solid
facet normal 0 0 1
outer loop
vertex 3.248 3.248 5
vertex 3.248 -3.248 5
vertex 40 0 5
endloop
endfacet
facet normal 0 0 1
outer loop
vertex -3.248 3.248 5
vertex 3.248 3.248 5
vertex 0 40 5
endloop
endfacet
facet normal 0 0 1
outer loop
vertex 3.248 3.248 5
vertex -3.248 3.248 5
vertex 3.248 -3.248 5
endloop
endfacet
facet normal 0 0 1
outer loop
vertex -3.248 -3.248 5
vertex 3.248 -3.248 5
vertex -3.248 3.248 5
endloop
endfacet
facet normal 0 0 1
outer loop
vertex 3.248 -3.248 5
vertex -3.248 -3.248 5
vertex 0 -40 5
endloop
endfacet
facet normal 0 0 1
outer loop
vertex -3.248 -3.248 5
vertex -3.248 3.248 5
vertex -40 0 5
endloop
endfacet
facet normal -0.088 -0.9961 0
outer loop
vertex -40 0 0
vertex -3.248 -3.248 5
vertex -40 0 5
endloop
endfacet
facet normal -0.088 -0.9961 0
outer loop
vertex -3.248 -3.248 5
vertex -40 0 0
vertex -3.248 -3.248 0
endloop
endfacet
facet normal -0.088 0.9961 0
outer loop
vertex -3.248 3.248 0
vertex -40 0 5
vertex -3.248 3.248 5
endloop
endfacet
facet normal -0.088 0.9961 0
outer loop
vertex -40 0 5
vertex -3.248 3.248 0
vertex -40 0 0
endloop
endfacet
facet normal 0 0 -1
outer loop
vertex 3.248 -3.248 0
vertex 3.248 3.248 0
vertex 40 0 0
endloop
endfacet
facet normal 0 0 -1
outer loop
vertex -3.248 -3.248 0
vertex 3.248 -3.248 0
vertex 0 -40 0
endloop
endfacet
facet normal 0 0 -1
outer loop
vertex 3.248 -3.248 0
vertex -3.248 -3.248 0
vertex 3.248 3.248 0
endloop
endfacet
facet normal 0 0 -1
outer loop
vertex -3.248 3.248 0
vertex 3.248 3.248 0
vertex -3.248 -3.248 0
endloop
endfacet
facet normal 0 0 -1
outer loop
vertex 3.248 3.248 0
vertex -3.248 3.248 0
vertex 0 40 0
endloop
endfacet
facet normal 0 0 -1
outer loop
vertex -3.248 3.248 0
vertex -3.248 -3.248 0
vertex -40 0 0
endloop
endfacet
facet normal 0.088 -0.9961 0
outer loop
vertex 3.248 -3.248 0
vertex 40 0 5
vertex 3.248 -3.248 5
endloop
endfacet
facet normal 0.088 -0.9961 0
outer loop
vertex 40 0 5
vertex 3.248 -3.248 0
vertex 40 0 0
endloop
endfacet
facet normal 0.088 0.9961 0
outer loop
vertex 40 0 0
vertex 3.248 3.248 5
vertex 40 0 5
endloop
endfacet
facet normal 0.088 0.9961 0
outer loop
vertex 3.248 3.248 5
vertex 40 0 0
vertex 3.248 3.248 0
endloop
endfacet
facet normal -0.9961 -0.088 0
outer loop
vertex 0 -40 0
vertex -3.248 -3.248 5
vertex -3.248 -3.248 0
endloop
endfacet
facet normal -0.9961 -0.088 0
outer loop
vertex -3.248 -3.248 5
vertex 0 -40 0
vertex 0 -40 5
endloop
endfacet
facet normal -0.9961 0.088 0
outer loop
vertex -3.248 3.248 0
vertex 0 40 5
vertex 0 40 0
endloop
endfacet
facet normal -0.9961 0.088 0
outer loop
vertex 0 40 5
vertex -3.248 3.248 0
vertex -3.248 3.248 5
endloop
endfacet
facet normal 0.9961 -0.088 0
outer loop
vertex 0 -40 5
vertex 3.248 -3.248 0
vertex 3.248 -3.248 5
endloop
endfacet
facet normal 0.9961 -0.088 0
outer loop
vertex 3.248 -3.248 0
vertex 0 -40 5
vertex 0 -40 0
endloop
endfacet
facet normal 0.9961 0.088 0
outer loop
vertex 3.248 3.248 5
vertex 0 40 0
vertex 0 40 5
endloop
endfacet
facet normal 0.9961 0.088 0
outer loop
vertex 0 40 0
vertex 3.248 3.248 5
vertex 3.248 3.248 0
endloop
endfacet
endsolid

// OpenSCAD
module fourStar(radius, fatness, height)
{
    union() {
        scale([radius / fatness * sqrt(2), 1, 1]) { //Scale to proper radius in x direction.
            rotate([0, 0, 45]) {
                translate([-fatness / 2, -fatness / 2, 0]) { //Move to coordinate centre.
                    cube([fatness, fatness, height]);
                }
            }
        }
        scale([1, radius / fatness * sqrt(2), 1]) { //Scale to proper radius in y direction.
            rotate([0, 0, 45]) {
                translate([-fatness / 2, -fatness / 2, 0]) { //Move to coordinate centre.
                    cube([fatness, fatness, height]);
                }
            }
        }
    }
}

fourStar(40, 5, 5);
